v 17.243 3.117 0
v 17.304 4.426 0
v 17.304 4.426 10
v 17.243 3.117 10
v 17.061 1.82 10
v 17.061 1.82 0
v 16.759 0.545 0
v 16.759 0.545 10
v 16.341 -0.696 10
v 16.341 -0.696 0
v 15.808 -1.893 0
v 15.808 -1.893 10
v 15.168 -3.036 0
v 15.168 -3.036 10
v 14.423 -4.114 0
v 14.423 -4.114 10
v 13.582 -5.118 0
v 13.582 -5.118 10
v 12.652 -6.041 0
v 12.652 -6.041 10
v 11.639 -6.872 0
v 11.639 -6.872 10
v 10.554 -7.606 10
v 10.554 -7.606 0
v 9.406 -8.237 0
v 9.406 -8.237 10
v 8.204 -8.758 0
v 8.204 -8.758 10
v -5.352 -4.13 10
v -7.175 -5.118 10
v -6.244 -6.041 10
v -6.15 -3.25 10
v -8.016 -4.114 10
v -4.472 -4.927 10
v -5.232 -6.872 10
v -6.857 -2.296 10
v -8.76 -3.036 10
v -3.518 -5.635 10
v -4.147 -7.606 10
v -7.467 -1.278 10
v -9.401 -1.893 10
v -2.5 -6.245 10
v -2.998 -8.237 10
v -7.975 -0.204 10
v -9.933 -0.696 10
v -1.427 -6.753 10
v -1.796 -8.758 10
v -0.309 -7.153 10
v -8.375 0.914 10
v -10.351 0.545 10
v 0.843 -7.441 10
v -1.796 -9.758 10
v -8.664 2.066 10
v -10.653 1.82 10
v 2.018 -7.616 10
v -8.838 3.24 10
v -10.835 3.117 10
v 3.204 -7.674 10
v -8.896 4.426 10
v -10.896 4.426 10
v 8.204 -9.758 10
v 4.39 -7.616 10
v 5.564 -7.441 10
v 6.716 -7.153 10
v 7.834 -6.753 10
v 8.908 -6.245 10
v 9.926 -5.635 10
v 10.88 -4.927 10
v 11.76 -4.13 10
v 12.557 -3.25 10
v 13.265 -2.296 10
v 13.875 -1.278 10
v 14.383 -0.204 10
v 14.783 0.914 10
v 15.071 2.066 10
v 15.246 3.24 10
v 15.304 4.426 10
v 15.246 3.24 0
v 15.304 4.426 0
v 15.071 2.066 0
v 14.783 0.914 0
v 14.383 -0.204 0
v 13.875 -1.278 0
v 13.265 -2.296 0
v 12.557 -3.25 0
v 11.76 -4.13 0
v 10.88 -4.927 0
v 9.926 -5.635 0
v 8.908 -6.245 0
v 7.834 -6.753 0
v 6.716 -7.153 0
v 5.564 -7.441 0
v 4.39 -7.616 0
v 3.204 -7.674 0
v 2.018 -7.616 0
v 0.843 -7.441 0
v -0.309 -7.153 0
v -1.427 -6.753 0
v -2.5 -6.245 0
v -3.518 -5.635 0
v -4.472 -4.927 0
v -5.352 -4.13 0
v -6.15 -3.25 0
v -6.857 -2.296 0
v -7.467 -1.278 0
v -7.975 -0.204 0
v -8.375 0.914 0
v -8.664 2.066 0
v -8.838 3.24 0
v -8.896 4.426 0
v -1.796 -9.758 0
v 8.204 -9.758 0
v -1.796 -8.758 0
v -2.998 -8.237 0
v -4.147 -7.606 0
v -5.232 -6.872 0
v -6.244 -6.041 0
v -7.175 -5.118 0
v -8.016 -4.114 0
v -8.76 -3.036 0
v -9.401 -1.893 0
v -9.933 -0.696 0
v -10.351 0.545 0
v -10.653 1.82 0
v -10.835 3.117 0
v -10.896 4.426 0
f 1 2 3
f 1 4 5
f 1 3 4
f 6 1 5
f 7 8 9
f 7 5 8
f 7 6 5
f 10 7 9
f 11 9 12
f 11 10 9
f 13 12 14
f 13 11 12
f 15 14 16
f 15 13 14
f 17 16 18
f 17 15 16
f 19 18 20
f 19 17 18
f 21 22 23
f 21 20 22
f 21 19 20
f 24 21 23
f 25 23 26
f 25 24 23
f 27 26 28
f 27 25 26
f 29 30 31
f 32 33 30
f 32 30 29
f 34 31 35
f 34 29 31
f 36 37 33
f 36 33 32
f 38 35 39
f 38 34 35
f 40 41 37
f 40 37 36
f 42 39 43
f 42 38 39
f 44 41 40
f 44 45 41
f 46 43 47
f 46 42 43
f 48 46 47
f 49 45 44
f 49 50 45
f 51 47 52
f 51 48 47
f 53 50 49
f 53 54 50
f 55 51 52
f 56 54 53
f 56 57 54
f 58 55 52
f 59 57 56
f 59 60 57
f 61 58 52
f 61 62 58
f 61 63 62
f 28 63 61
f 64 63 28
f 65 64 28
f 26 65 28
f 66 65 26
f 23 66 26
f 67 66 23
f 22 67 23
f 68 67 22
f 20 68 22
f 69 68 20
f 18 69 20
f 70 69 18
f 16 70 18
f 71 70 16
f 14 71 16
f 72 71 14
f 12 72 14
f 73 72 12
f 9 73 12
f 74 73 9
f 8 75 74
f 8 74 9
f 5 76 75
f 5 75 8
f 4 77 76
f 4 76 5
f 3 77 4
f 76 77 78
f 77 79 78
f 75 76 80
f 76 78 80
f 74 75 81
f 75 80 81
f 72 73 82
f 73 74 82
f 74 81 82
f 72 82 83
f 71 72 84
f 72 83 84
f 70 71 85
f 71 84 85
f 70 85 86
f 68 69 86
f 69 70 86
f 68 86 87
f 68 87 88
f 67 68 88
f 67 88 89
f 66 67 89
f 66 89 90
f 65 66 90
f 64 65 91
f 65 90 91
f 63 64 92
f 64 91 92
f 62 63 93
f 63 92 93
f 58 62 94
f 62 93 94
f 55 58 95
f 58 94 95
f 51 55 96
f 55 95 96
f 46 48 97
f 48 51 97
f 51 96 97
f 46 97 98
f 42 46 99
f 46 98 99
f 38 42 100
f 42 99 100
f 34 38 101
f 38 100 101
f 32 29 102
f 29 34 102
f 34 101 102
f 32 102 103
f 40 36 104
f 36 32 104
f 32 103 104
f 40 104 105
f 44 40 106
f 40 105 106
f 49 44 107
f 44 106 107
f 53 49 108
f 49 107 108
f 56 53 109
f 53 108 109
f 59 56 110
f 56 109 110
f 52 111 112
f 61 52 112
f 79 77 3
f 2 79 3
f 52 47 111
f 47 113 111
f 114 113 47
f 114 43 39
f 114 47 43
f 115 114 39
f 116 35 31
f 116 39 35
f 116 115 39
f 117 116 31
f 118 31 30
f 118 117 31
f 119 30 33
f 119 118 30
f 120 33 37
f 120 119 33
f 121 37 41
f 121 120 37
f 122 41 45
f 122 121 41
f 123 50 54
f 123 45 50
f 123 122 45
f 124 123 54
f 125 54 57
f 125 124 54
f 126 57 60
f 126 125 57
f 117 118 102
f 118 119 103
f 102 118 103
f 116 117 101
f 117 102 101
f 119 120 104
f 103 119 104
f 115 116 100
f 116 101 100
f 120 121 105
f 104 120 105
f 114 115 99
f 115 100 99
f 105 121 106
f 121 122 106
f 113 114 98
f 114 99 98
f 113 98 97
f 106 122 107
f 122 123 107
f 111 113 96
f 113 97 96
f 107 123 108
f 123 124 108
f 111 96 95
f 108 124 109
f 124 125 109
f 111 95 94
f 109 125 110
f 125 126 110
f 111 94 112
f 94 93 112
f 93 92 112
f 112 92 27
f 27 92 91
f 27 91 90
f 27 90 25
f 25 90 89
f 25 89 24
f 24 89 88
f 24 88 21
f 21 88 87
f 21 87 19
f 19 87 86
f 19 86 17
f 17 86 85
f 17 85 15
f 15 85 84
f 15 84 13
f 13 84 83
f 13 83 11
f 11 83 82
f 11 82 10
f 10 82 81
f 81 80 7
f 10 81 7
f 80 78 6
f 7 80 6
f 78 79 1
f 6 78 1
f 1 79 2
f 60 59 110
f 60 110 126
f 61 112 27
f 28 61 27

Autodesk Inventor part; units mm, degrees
ref_plane "YZ Plane" through (0, 0, 0) normal (1, 0, 0) x (0, 1, 0)
ref_plane "XZ Plane" through (0, 0, 0) normal (0, 1, 0) x (-1, 0, 0)
ref_plane "XY Plane" through (0, 0, 0) normal (0, 0, 1) x (1, 0, 0)
sketch "Sketch2" plane through (0, 0, 0) normal (0, 0, 1) x (1, 0, 0)
  circle A0 centre (3.2039, 4.4261) radius 14.1
  circle A1 centre (3.2039, 4.4261) radius 12.1
  line L0 (-1.7961, -8.7576) -> (8.2039, -8.7576)
  line L1 (-1.7961, -8.7576) -> (-1.7961, -9.7576)
  line L2 (-1.7961, -9.7576) -> (8.2039, -9.7576)
  line L3 (8.2039, -9.7576) -> (8.2039, -8.7576)
  line L4 (-8.8961, 4.4261) -> (-10.8961, 4.4261)
  line L5 (15.3039, 4.4261) -> (17.3039, 4.4261)
  dimension "d6" = 28.2
  dimension "d7" = 24.2
  dimension "d8" = 1
  dimension "d9" = 10
extrude "Extrusion2" add sketch "Sketch2" along normal blind 10 contours A0 L0 L4 A1 L5 | L3 L2 L1 A0 | A0 L0
properties part number "clip-pipe" material "PC/ABS Plastic"
